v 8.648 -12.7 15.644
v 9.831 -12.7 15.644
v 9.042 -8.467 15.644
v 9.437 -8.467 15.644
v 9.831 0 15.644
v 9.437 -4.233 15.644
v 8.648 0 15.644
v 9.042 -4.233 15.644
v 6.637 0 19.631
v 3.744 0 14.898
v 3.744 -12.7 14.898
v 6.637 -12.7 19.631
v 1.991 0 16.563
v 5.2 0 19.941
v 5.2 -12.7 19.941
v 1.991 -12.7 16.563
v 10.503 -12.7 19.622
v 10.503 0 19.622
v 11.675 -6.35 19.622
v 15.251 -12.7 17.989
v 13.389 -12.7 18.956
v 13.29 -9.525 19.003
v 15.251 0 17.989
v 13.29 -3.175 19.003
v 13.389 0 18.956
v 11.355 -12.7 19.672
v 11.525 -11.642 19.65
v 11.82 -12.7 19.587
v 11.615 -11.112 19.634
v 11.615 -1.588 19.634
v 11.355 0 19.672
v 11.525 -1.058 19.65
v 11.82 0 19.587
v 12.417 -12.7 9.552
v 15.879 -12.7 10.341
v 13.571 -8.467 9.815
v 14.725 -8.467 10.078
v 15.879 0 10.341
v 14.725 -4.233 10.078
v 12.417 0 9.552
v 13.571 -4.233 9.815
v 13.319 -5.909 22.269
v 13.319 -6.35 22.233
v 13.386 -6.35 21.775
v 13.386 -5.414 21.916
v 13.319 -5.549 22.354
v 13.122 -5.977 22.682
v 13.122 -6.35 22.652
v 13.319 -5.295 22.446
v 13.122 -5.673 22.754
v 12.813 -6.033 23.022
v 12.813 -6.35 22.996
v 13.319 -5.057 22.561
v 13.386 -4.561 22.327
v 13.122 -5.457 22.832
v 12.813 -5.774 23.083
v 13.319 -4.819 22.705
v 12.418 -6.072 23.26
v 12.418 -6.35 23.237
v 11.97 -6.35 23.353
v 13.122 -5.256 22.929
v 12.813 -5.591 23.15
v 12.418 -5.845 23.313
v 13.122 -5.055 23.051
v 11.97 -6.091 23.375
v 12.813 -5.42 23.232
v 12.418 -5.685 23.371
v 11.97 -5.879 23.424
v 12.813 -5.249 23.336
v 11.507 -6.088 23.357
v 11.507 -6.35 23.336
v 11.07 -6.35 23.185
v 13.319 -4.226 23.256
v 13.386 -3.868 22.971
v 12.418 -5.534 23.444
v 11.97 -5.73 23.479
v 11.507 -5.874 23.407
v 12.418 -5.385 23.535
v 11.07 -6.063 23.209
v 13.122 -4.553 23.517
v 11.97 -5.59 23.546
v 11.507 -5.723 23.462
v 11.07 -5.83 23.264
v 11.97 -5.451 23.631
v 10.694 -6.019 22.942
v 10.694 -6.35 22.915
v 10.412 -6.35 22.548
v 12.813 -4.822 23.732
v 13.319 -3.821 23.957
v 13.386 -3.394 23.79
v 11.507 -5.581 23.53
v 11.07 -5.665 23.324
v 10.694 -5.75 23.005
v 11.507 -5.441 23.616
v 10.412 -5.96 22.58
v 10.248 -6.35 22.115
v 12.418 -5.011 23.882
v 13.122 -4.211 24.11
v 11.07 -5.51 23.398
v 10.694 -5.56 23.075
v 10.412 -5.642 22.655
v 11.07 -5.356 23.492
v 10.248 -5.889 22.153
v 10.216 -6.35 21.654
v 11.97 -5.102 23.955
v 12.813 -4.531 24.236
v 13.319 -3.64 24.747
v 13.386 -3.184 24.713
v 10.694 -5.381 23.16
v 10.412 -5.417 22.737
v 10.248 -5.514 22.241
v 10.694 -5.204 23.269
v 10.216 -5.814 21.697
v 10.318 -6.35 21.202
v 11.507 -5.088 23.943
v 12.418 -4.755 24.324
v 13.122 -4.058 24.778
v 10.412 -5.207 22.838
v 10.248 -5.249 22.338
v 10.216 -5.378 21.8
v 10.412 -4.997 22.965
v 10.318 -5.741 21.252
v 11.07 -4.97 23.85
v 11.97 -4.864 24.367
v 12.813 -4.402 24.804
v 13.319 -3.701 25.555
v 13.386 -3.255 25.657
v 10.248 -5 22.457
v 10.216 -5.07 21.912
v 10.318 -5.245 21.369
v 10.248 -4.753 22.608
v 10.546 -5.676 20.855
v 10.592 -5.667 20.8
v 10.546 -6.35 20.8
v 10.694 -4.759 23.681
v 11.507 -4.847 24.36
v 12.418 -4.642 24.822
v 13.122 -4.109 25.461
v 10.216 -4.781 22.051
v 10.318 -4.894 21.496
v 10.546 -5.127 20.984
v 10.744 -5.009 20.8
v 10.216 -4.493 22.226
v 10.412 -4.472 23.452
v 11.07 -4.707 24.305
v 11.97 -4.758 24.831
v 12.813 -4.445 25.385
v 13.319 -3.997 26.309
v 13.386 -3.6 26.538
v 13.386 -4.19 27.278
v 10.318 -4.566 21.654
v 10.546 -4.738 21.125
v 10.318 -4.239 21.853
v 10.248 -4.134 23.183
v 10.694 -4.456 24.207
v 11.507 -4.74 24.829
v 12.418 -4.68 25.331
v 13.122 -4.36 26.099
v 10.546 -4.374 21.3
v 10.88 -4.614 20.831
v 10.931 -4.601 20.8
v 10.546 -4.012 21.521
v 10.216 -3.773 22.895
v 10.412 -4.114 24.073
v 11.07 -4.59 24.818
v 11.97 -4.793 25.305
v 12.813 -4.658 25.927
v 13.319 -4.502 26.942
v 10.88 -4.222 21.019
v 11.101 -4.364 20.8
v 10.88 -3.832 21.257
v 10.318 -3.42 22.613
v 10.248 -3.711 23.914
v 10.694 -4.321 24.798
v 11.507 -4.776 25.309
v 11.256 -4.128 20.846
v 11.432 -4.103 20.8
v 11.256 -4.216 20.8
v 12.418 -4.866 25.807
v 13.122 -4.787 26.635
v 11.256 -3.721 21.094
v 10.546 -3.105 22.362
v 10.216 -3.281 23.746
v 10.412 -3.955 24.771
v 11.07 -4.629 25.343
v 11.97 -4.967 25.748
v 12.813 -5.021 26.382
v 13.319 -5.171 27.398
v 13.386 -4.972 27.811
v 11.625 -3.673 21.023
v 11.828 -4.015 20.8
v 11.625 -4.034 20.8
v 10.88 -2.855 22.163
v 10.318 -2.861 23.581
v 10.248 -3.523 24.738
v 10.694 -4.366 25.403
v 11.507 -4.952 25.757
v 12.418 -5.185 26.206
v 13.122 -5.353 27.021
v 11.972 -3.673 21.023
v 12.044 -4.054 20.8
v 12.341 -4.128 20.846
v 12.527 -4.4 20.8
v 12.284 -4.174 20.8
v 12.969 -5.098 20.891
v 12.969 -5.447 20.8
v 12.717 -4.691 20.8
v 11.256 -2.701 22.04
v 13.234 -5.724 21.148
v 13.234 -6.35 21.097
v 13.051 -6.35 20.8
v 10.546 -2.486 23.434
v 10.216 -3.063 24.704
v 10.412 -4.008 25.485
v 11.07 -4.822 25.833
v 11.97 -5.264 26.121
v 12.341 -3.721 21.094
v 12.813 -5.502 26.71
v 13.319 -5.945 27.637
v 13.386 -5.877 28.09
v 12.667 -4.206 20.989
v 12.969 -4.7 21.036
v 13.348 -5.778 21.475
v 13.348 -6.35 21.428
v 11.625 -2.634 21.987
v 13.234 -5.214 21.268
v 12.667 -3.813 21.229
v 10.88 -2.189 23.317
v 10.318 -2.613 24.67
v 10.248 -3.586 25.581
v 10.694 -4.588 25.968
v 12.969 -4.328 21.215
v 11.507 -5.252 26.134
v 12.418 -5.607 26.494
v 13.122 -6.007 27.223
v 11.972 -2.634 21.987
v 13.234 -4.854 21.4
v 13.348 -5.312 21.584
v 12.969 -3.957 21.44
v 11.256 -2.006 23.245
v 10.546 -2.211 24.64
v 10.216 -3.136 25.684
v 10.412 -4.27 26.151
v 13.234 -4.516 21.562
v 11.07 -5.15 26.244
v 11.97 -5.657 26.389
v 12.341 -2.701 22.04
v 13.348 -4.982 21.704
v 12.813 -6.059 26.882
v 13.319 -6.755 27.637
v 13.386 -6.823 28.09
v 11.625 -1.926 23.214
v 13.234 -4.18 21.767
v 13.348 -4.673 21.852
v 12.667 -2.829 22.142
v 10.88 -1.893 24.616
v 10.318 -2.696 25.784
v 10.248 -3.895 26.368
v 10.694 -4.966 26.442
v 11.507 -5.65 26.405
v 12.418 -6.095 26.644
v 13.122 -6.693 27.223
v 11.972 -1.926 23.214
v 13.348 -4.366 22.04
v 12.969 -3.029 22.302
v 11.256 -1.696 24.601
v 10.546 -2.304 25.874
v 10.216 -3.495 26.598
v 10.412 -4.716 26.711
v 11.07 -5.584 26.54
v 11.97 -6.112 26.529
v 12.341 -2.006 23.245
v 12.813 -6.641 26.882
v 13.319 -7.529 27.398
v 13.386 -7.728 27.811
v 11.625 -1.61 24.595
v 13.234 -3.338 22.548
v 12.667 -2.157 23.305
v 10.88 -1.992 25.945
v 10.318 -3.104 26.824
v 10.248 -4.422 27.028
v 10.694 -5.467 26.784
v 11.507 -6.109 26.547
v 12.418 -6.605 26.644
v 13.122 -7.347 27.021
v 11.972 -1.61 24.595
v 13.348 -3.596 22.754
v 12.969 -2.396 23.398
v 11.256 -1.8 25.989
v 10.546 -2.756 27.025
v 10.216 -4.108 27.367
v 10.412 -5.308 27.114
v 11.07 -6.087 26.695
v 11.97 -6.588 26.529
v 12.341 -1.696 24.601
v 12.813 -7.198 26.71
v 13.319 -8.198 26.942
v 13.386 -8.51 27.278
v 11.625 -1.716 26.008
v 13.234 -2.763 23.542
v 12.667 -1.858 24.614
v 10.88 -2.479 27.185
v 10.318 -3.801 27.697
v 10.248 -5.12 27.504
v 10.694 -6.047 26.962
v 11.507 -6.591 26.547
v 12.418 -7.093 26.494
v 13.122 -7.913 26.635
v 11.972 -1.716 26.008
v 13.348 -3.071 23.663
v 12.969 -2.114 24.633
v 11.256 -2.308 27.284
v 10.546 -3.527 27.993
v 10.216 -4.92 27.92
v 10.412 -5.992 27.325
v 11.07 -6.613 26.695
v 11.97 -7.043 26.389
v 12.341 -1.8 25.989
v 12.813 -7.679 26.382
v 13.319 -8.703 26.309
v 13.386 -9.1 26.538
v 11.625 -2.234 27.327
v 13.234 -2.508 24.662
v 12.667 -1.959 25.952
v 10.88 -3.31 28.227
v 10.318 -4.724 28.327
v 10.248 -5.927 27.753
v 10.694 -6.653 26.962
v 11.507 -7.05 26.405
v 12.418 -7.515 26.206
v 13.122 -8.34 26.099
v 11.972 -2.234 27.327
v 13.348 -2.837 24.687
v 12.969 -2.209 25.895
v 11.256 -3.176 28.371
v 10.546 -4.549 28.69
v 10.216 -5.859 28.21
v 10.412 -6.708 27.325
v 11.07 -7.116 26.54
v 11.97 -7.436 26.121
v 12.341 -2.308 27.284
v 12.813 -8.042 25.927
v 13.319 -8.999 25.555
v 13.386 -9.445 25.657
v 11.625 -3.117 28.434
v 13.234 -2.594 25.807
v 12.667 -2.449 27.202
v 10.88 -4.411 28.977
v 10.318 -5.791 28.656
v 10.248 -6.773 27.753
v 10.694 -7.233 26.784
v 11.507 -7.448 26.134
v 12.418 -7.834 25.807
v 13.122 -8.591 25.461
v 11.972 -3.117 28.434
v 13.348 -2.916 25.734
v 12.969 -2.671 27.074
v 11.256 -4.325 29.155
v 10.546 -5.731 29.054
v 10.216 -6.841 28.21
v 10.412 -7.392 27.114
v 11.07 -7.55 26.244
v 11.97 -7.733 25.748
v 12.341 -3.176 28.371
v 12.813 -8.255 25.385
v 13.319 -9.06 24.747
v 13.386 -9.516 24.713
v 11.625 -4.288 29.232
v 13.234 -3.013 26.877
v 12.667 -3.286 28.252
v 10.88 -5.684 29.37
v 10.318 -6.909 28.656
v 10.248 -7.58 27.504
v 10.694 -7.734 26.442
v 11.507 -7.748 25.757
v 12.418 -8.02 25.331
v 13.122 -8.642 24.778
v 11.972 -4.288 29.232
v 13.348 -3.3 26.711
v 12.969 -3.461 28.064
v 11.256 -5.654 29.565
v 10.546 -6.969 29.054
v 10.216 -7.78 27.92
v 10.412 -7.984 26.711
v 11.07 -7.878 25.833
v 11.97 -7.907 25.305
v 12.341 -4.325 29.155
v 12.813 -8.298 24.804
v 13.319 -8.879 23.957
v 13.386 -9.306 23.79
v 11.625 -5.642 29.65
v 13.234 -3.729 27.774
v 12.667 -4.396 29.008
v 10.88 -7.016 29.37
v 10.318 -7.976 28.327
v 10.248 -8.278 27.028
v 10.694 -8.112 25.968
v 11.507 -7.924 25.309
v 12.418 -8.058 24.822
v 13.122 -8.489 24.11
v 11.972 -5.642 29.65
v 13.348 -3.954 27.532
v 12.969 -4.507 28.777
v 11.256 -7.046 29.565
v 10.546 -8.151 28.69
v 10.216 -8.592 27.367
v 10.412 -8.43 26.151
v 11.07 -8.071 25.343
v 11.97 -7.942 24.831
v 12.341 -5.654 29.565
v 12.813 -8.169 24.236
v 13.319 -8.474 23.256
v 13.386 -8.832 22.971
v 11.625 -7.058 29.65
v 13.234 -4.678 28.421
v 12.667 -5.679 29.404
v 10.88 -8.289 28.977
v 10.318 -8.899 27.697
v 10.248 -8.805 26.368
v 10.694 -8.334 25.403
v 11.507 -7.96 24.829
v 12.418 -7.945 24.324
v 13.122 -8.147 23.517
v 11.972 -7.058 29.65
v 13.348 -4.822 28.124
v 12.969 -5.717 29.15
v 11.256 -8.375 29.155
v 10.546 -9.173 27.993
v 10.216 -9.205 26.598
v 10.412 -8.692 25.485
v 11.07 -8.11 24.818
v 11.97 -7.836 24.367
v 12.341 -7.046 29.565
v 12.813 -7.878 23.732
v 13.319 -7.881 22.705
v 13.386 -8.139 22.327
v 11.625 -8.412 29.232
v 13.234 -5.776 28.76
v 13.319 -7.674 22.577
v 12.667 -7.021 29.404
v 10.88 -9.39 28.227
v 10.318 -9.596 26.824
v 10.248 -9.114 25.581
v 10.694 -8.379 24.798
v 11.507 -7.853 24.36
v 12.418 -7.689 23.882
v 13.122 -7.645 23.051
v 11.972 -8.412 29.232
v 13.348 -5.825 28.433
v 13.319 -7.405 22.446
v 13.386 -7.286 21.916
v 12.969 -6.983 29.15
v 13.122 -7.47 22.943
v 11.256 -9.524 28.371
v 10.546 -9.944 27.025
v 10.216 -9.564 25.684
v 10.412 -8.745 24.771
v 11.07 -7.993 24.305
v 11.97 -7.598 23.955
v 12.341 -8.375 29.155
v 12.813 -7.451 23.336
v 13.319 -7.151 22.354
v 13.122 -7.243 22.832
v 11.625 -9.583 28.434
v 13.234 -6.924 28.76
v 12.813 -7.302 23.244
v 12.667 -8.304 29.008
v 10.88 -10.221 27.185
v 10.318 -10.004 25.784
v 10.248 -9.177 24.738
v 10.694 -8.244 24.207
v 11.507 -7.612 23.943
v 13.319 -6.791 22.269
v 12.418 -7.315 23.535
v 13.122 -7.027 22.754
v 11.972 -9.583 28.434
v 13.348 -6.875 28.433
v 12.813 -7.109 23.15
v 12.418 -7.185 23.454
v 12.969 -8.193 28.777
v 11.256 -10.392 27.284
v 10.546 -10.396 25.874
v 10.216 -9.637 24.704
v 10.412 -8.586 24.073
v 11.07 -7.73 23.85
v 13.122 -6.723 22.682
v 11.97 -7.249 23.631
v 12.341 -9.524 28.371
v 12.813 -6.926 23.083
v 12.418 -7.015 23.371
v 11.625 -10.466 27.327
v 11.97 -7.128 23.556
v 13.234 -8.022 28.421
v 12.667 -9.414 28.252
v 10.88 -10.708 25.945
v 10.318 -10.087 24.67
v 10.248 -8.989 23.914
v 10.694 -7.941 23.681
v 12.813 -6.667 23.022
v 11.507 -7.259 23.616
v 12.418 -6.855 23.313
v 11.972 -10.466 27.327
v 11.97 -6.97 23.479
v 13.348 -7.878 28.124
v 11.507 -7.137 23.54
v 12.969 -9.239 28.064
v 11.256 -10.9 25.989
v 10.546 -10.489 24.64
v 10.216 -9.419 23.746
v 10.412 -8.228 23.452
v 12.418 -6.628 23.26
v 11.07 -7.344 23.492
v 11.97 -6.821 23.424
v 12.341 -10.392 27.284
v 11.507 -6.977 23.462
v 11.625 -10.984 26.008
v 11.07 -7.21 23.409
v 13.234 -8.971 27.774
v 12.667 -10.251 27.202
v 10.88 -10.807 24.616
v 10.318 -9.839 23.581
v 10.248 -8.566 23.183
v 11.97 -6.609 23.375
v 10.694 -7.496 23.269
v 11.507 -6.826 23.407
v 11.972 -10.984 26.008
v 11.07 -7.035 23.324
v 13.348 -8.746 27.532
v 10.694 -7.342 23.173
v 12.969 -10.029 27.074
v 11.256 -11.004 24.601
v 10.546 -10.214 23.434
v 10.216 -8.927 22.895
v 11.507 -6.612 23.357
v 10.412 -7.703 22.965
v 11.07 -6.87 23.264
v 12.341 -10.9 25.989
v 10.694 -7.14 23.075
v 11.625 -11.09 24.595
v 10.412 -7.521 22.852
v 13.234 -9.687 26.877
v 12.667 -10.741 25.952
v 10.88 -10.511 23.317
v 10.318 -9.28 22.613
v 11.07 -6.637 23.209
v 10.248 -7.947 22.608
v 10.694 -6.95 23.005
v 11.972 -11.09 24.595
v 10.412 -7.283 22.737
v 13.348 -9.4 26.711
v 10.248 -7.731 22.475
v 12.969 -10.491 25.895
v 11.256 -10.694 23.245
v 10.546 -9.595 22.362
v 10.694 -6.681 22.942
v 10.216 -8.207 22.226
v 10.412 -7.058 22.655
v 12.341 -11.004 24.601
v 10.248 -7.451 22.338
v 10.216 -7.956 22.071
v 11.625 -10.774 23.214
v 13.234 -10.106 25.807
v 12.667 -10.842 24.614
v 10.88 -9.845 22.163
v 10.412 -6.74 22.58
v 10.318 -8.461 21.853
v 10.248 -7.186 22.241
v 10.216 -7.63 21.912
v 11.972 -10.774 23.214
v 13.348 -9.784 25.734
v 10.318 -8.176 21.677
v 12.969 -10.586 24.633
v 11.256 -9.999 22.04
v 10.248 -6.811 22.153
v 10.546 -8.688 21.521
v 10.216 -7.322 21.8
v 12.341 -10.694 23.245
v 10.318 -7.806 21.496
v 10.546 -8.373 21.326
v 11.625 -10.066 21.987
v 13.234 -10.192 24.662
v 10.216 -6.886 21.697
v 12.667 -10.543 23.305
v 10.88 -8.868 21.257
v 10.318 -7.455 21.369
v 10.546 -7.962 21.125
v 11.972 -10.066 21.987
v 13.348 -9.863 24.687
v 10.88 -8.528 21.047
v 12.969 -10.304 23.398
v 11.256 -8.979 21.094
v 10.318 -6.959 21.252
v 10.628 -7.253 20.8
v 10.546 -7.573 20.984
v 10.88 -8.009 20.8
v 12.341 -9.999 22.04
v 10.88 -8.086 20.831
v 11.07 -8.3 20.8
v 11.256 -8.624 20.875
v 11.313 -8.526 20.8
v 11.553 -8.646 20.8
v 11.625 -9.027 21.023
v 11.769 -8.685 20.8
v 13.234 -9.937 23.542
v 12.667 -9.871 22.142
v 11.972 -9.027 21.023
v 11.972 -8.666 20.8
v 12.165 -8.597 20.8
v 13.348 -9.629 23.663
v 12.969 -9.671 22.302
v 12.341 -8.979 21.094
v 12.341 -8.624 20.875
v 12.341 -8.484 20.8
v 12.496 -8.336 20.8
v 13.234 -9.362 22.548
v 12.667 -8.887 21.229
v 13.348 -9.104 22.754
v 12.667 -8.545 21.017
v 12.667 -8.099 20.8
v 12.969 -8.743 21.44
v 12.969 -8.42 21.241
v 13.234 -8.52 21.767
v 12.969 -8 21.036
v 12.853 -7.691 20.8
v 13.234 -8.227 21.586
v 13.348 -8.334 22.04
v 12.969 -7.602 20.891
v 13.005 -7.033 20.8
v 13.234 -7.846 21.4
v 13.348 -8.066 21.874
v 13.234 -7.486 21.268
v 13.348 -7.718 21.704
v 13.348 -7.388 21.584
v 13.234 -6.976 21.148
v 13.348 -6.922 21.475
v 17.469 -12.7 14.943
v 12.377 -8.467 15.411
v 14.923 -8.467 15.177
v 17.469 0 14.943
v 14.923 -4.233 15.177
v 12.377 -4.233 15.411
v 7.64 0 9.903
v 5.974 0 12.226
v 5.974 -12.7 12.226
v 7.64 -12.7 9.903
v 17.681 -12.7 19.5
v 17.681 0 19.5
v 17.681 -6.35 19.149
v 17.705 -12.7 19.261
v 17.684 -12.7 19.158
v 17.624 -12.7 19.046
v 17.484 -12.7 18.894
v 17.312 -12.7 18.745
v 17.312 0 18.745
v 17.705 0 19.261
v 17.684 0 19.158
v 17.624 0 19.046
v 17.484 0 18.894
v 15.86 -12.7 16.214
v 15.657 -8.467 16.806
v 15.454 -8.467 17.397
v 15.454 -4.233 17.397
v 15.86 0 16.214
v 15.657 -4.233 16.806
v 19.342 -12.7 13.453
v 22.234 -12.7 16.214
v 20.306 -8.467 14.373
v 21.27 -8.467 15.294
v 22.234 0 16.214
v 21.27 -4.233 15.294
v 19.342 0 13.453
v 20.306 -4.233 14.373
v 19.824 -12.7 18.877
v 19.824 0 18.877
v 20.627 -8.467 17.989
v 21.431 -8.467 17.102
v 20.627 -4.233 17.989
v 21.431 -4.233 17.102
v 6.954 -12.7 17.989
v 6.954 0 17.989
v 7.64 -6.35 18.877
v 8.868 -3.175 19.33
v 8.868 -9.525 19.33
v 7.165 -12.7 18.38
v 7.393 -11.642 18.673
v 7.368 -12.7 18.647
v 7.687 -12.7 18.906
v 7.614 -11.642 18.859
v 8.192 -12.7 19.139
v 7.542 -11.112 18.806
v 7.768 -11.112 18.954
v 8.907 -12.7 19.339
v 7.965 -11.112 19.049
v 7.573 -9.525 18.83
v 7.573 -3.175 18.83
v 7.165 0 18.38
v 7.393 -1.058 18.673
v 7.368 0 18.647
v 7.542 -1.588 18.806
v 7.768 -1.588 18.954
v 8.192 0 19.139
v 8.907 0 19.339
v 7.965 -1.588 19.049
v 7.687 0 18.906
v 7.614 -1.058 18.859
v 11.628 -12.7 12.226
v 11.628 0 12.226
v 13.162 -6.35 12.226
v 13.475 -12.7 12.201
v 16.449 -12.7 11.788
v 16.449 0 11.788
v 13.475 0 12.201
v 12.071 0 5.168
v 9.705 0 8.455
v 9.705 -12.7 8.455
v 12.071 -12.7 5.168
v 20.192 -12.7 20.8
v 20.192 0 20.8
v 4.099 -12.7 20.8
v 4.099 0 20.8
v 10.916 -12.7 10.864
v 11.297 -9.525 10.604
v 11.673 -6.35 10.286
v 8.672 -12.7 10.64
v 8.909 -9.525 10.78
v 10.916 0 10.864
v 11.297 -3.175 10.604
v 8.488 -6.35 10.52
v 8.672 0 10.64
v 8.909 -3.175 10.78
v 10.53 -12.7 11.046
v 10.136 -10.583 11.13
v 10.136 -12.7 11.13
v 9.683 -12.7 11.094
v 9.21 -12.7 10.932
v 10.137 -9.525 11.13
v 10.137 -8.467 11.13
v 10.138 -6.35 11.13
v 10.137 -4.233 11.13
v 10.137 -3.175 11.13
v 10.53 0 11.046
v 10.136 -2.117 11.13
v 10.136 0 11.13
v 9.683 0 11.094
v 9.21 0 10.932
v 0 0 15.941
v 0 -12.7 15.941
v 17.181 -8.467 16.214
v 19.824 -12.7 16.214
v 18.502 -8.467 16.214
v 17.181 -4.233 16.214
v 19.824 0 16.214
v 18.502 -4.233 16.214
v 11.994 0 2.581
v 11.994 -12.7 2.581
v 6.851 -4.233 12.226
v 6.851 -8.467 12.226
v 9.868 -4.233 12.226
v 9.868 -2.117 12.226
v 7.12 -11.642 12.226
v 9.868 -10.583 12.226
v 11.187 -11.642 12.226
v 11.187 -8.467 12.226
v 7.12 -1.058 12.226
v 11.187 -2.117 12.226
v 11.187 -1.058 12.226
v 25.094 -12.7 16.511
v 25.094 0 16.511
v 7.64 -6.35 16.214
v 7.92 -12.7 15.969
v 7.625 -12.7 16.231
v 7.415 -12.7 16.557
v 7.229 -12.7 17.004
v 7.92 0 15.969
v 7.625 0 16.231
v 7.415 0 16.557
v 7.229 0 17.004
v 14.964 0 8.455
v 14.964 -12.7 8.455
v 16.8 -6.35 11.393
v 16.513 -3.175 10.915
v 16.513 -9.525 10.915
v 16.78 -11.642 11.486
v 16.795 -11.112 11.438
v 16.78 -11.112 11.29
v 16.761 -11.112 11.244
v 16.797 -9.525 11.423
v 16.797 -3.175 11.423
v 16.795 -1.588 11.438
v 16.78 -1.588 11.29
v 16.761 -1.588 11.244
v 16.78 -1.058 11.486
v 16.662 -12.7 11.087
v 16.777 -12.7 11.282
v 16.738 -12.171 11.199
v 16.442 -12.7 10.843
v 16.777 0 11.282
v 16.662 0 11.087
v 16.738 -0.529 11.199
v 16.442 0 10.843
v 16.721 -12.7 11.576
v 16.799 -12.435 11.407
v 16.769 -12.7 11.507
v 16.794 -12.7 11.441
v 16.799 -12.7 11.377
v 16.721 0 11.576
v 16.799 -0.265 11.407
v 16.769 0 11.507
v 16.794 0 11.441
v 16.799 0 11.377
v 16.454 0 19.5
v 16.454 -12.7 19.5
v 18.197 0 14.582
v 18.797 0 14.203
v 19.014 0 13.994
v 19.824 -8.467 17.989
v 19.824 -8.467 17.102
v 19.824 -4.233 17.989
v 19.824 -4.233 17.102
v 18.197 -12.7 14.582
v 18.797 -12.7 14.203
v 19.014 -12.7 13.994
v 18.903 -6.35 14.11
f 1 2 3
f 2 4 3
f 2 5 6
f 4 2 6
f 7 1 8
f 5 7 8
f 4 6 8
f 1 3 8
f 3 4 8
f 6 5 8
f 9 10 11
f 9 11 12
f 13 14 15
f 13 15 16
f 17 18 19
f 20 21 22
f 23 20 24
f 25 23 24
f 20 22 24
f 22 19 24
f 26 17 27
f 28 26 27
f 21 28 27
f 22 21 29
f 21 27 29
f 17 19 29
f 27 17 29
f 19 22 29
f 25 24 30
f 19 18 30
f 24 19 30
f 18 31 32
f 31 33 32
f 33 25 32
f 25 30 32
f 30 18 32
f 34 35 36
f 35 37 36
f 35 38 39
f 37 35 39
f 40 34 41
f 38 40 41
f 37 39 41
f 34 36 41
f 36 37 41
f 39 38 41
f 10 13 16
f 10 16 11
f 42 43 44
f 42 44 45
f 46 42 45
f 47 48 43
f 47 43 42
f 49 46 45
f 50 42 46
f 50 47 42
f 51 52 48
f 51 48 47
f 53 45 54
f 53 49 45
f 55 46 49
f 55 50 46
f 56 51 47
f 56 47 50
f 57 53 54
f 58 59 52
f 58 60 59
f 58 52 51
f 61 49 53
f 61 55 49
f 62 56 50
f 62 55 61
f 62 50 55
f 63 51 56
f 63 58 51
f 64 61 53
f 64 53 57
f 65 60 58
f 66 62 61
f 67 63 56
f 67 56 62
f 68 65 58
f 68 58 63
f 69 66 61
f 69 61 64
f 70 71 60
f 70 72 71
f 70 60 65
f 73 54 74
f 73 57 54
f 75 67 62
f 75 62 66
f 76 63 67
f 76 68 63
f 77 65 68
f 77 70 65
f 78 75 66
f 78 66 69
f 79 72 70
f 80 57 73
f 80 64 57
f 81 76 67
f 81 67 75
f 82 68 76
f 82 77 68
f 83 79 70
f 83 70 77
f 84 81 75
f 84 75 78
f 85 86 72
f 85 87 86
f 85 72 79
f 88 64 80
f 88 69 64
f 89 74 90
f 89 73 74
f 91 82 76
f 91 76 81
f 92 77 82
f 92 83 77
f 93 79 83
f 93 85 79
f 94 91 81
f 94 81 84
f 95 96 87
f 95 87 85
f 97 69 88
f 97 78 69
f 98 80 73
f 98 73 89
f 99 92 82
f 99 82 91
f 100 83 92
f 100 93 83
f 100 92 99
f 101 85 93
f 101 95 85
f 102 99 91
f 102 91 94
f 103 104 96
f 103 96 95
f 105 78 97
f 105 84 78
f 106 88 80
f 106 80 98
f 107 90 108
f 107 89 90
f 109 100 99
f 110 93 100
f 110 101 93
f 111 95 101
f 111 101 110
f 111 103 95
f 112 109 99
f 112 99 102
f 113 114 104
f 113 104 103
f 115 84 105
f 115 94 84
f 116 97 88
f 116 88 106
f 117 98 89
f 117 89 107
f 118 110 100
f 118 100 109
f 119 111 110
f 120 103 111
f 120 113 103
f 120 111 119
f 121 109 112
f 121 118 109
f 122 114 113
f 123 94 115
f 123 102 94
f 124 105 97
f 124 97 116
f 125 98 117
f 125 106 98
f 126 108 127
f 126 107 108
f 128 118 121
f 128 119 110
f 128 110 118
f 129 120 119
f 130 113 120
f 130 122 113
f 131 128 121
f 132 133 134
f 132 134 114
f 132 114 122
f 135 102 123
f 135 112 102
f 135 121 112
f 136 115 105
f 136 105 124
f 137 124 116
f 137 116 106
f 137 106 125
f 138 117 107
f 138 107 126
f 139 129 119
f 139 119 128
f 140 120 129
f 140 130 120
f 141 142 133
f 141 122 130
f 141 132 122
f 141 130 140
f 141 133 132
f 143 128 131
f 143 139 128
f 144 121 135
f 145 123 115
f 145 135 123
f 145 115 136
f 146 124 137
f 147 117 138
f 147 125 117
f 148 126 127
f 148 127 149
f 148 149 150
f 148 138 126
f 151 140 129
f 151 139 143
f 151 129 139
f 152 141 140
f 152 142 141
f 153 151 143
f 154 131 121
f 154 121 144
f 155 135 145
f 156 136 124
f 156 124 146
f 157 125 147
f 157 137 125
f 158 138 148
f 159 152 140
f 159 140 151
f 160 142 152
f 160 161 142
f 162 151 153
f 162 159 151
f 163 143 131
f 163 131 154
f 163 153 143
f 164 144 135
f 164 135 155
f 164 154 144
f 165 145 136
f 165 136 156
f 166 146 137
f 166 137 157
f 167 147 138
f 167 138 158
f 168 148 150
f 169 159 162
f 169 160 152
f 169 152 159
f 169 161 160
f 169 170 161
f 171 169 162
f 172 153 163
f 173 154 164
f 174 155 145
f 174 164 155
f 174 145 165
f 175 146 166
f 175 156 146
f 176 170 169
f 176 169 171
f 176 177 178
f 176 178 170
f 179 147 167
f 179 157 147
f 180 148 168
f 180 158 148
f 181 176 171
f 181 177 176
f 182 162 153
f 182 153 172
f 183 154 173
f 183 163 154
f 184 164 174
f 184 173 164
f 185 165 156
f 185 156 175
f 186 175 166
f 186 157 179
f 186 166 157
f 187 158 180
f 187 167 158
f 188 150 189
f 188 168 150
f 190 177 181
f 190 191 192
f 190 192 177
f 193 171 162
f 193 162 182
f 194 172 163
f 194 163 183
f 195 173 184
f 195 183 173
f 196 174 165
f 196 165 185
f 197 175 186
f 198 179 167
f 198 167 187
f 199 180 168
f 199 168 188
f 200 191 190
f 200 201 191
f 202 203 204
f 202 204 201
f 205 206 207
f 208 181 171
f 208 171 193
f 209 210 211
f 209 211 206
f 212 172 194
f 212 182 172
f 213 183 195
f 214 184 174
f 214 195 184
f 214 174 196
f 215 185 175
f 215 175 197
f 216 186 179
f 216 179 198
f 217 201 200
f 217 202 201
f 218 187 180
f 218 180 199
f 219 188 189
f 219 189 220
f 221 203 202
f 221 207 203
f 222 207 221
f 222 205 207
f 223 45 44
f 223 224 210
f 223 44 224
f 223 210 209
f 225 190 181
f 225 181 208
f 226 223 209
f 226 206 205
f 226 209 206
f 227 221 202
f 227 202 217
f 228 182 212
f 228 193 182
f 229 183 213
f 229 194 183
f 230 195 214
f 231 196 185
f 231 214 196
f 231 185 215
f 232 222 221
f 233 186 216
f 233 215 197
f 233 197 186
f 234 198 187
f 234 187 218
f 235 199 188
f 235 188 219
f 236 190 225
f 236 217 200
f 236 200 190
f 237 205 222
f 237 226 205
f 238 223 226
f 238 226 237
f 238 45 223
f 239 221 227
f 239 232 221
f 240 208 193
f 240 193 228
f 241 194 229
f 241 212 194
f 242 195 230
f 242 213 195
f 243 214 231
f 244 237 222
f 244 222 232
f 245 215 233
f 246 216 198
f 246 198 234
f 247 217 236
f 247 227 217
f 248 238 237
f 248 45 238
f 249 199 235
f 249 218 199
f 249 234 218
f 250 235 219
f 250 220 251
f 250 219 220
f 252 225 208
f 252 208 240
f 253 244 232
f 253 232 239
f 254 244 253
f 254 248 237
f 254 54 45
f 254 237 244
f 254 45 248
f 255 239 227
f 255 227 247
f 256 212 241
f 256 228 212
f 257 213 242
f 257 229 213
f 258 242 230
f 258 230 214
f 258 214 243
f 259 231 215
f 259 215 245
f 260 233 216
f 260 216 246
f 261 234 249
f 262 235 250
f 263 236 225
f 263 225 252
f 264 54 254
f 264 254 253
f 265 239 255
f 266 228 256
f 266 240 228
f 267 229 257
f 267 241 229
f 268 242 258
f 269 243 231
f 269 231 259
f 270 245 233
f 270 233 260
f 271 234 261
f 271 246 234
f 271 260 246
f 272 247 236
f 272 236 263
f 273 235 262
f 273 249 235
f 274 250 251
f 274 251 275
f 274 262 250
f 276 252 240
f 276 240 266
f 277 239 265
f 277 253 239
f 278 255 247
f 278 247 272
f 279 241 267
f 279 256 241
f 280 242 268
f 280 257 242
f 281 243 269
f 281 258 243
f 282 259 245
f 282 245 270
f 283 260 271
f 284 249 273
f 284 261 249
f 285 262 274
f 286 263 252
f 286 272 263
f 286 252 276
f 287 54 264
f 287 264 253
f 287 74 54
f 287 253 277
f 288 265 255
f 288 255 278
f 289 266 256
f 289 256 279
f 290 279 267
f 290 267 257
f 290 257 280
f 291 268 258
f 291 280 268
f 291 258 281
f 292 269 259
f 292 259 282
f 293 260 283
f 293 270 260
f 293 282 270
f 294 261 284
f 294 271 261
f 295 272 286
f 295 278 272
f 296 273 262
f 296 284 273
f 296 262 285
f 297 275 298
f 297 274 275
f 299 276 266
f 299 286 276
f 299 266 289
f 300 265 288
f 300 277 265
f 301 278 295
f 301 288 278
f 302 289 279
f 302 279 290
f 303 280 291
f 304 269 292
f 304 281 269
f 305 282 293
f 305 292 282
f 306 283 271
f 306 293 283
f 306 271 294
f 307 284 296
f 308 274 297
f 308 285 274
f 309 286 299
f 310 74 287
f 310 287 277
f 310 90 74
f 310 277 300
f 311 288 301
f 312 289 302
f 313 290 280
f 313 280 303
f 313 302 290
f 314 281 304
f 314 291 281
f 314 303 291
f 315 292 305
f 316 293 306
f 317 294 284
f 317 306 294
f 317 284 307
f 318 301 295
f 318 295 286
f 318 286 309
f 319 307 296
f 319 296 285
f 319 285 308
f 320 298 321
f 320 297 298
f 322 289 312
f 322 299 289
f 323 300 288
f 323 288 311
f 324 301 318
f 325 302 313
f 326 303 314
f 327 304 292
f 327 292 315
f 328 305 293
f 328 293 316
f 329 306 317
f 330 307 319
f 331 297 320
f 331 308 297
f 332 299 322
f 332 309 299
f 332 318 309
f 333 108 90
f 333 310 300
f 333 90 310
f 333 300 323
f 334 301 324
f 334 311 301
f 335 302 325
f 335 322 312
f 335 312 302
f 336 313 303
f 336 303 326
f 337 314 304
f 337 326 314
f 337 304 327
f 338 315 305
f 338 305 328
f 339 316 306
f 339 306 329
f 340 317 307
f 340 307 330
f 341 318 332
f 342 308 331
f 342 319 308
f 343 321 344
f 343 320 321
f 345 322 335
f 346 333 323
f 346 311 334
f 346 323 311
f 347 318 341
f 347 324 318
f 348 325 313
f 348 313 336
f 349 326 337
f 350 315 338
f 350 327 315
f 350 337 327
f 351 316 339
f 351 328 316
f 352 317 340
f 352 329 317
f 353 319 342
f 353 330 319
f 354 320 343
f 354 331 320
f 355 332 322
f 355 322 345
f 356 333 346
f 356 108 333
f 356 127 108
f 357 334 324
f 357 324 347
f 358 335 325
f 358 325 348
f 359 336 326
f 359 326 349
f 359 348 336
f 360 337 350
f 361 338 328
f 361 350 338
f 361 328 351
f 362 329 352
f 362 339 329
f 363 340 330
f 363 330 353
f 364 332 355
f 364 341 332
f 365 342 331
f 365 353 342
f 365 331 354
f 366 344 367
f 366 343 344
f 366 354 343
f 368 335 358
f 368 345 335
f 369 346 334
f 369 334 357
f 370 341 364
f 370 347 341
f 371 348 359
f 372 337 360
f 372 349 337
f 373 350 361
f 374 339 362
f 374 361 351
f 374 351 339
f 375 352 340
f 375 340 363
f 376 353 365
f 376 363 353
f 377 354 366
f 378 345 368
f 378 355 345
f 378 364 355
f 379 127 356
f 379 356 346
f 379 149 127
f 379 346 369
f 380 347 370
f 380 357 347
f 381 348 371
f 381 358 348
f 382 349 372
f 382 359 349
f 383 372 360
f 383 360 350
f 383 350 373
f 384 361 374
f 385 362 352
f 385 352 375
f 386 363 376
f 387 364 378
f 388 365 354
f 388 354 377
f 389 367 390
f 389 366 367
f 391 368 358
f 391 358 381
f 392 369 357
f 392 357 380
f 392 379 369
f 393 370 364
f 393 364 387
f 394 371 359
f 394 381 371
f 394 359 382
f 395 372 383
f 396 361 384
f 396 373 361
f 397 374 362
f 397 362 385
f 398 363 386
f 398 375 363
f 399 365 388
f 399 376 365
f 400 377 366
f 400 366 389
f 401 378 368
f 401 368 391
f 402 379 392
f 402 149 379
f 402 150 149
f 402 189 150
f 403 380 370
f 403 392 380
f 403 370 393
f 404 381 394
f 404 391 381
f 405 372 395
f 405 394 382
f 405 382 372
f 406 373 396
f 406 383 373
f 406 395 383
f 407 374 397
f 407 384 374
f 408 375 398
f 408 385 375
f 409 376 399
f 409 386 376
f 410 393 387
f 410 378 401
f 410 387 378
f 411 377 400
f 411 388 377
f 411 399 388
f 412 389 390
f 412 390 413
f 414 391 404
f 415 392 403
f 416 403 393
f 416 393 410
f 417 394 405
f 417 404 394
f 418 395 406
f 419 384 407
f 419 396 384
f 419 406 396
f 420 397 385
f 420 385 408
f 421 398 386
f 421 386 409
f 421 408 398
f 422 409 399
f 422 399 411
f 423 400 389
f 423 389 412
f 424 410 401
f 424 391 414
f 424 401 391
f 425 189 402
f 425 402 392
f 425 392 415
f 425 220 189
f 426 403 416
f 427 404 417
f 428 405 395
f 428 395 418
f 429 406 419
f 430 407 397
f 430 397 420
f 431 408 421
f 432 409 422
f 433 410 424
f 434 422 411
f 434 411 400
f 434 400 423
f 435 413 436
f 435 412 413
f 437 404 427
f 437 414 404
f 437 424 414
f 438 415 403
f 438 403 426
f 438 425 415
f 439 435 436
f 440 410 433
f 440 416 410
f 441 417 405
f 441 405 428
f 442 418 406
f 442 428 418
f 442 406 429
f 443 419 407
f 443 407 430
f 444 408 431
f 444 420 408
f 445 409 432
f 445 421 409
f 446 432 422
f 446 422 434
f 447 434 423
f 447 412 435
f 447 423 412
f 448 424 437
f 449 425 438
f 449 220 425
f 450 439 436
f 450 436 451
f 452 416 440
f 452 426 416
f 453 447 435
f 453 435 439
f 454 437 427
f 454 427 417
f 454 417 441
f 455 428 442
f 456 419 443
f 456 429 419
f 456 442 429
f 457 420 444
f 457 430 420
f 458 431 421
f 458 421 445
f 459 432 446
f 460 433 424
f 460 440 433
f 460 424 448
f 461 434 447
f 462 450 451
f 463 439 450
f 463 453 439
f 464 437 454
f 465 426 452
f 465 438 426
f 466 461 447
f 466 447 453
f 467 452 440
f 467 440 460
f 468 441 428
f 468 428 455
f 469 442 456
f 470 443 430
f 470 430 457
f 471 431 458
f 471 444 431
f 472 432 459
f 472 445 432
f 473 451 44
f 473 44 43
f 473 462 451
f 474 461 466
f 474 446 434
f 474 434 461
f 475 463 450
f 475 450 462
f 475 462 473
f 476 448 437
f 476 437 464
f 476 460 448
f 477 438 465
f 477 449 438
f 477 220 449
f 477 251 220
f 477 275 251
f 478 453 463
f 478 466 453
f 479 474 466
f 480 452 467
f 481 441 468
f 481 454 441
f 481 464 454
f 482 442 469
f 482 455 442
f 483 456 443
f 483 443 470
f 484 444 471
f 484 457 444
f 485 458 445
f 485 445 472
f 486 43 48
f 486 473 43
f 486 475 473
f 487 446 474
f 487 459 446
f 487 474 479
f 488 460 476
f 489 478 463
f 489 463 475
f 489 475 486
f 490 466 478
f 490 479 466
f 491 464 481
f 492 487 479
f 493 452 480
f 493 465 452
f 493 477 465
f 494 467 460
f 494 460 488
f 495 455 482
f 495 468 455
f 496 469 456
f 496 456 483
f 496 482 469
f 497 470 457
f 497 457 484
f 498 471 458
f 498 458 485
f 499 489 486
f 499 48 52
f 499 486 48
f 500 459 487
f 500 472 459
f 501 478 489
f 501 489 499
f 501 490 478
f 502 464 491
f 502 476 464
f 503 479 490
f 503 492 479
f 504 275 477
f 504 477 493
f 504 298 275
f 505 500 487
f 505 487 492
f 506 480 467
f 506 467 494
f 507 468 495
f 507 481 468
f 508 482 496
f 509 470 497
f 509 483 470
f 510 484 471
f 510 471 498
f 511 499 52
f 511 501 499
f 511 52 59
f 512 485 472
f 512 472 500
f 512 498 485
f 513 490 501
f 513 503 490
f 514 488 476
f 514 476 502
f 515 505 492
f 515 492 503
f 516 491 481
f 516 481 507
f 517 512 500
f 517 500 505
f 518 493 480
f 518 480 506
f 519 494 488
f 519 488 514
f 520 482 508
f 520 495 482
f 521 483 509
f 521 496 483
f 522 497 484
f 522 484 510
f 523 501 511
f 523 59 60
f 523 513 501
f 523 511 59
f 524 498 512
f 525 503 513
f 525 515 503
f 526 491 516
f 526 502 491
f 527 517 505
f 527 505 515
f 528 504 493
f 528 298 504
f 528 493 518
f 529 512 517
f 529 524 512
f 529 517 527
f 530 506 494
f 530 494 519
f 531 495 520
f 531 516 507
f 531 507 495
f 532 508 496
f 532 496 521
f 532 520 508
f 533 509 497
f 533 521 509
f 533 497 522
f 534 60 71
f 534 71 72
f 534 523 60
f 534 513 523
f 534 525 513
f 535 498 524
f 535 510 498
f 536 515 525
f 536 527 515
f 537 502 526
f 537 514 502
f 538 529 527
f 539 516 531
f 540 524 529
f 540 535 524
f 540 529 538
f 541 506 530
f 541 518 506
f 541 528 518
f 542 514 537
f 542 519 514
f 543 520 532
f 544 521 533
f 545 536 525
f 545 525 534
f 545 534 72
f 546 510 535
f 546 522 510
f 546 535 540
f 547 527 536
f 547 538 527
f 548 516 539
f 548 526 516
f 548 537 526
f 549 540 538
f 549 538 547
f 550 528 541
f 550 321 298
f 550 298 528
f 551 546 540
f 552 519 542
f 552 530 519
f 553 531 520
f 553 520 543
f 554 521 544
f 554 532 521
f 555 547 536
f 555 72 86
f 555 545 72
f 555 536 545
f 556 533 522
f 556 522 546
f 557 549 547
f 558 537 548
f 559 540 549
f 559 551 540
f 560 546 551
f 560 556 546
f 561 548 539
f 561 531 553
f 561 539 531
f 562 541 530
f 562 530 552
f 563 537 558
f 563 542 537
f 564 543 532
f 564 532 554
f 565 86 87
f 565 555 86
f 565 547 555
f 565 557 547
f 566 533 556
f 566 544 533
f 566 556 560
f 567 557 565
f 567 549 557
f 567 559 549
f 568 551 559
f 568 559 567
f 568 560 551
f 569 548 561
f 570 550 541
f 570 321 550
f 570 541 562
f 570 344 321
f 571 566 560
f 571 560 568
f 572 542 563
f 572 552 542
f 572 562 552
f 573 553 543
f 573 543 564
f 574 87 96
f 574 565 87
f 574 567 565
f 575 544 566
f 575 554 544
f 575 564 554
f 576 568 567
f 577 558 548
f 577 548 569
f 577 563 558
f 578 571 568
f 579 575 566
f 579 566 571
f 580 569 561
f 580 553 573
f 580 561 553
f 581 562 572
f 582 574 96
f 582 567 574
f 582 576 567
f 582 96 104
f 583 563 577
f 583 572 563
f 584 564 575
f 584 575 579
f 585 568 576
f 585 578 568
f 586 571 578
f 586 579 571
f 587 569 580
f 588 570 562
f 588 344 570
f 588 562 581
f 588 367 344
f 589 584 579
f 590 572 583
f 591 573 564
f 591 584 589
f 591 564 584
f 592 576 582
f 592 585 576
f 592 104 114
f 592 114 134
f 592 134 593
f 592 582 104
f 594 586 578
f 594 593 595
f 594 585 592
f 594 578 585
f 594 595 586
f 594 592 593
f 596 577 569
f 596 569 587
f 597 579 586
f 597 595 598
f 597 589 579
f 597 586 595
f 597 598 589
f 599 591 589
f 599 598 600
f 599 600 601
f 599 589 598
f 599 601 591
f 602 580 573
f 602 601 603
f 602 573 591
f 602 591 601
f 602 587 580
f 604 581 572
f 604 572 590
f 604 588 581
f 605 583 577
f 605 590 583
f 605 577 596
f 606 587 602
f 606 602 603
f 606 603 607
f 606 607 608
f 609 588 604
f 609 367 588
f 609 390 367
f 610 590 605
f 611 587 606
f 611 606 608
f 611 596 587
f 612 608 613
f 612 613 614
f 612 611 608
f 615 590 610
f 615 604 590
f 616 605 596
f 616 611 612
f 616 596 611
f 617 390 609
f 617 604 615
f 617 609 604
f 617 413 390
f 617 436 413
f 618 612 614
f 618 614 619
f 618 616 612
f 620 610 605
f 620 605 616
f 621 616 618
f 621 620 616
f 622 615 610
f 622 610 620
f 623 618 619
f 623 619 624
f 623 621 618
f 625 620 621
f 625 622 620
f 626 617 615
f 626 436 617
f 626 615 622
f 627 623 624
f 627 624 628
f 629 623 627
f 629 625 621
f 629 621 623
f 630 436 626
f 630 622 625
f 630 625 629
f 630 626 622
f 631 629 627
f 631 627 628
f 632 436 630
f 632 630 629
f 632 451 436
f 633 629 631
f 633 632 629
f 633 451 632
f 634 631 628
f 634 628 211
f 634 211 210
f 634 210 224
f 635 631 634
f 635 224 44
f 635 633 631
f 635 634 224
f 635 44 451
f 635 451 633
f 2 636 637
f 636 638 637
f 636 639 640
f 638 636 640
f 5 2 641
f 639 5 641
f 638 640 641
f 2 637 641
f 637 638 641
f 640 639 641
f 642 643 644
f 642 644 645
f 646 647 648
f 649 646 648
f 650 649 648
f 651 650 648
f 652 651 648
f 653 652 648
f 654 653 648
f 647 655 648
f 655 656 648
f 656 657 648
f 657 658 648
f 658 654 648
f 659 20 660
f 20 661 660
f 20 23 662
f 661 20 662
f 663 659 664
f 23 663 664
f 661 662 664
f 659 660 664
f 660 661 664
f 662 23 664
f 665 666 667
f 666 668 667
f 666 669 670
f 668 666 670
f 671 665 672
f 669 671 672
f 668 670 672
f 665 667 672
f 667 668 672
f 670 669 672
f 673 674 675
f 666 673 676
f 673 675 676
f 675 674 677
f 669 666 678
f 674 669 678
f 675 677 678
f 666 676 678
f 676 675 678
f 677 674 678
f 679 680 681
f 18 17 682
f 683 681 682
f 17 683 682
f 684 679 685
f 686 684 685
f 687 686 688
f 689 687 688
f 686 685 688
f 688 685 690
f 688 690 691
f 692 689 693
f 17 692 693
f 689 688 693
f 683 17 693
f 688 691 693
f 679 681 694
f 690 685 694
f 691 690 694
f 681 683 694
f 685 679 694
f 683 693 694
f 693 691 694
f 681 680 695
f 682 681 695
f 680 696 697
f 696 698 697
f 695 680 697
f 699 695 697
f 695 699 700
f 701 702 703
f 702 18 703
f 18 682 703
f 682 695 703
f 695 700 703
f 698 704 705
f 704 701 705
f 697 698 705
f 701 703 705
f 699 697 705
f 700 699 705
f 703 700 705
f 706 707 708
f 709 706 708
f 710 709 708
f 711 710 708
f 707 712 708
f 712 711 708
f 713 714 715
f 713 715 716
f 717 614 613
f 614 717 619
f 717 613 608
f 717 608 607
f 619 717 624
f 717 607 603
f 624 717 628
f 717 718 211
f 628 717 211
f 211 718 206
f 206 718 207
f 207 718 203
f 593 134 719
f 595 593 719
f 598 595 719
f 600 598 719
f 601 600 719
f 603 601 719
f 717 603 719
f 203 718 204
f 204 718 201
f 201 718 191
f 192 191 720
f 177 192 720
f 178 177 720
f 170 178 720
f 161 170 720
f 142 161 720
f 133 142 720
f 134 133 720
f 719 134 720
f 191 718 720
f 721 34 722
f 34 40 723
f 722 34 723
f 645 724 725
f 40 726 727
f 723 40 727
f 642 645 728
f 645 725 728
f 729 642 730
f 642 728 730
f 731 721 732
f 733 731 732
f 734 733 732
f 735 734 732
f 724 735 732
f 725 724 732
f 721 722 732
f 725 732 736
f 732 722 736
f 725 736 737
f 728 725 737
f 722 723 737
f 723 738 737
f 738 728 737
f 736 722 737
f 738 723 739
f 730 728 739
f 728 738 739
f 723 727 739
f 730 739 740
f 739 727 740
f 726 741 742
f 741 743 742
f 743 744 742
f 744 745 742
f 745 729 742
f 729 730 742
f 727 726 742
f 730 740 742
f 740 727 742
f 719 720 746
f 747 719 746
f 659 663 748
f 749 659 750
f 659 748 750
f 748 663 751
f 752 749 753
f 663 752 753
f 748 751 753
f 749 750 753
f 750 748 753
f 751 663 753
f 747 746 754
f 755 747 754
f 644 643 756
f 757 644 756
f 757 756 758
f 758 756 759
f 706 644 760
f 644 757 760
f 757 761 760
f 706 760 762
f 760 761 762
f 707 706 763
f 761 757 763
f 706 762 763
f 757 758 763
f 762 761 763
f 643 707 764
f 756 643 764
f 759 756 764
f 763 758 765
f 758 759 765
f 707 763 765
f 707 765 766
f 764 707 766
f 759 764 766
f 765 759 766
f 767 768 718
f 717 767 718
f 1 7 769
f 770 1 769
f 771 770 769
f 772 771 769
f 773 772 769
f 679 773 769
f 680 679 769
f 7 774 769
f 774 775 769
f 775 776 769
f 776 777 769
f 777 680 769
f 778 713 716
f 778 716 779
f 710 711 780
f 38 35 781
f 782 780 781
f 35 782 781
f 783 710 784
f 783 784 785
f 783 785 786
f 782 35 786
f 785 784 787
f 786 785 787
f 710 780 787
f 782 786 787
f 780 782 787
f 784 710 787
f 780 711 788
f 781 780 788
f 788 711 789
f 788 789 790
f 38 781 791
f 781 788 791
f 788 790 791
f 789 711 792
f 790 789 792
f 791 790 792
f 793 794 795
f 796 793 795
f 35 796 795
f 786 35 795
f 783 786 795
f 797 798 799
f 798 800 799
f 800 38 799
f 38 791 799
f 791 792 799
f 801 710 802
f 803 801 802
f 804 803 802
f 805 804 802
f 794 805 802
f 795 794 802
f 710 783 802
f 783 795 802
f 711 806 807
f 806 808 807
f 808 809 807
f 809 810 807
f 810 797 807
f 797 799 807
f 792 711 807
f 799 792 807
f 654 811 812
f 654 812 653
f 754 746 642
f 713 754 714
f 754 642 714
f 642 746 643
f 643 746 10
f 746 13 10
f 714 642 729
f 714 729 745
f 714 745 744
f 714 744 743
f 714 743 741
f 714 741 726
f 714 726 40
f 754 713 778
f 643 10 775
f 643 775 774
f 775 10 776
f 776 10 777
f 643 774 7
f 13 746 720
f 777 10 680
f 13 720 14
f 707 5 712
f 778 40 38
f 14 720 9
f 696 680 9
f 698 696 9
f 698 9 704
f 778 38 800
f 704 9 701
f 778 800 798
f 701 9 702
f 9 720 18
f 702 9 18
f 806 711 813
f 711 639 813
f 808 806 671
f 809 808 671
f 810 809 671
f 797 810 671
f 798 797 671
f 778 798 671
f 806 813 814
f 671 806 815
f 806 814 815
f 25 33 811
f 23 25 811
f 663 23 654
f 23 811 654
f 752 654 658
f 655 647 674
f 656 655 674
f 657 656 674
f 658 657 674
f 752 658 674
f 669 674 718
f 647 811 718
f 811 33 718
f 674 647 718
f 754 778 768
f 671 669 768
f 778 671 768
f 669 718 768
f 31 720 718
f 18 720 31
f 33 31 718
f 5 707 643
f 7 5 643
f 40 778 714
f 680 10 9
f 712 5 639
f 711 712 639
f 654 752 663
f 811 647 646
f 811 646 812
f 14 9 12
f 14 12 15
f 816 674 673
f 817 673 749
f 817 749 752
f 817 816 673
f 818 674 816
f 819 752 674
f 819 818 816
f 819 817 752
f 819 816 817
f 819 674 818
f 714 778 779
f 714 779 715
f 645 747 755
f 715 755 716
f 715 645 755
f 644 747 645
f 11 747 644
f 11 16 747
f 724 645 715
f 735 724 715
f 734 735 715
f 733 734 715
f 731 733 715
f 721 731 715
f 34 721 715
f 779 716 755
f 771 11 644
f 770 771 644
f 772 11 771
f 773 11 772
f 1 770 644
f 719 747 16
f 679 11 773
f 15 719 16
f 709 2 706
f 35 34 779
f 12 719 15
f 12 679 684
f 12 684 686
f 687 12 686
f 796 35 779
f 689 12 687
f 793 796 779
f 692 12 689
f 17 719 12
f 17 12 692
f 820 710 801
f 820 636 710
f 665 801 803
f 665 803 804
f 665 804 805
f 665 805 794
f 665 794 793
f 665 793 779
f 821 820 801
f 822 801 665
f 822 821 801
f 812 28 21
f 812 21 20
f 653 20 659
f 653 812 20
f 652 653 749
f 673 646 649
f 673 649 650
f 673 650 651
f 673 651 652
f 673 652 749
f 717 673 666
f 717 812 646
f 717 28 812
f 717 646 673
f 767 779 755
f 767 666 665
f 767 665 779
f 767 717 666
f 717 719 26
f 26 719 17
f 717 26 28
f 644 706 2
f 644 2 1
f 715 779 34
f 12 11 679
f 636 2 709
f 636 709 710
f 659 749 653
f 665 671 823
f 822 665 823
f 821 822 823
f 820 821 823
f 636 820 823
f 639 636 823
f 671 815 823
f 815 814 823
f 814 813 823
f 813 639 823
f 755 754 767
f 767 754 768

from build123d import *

# Parameters (mm, degrees)
F1_DEPTH = 12.7
F3_DEPTH = 12.7
F5_R     = 1.5875


with BuildPart() as f1:
    # F0 (on Front) → F1 (new body)
    with BuildSketch(Plane.XZ):
        Polygon((20.1922785491, 20.7995641977), (4.0991832502, 20.7995641977), (0, 15.9412715584), (11.9939092547, 2.5809677318), (25.0935649863, 16.5109376256), align=None)
    extrude(amount=F1_DEPTH)

    # F2 (on Front) → F3 (cut)
    with BuildSketch(Plane.XZ):
        with BuildLine():
            Line((17.6813211292, 19.4996427745), (16.4541602135, 19.4996427745))
            Line((16.4541602135, 19.4996427745), (17.3117336033, 18.7449781331))
            add(Edge.make_bspline(
                [(17.6813211292, 19.4996427745), (17.7032305031, 19.3807477202), (17.7525202529, 19.1132682608), (17.4691469903, 18.8765016183), (17.3117336033, 18.7449781331)],
                knots=[0, 0, 0, 0, 0.4445016245, 1, 1, 1, 1], degree=3))
        make_face()
        Polygon((5.2000629936, 19.9409676004), (1.9912079442, 16.5632255375), (3.7442932371, 14.8977944627), (6.6368840635, 19.6311250329), align=None)
        with BuildLine():
            add(Edge.make_bspline(
                [(5.9742834419, 12.2258234769), (6.1523076349, 12.2258234769), (6.7421028422, 12.2258234769), (11.5059476456, 12.2258234769), (11.614881434, 12.2258234769), (11.6279833019, 12.2258234769)],
                knots=[0, 0, 0, 0, 0.2755402737, 0.9128665611, 1, 1, 1, 1], degree=3))
            Line((5.9742834419, 12.2258234769), (7.6397149824, 9.9029857665))
            add(Edge.make_bspline(
                [(12.4168721959, 9.5523688942), (11.6750178309, 10.3115895536), (10.1897836888, 11.8315919933), (8.4903196969, 10.5462945311), (7.6397149824, 9.9029857665)],
                knots=[0, 0, 0, 0, 0.4994864742, 1, 1, 1, 1], degree=3))
            add(Edge.make_bspline(
                [(15.8792156726, 10.3412568569), (14.7251011804, 10.0782942027), (13.5709866881, 9.8153315485), (12.4168721959, 9.5523688942)],
                knots=[0, 0, 0, 0, 3.5510796342, 3.5510796342, 3.5510796342, 3.5510796342], degree=3))
            add(Edge.make_bspline(
                [(16.4489671588, 11.7875523865), (16.6239572067, 11.6720505113), (17.0837218758, 11.3685836453), (16.3399204362, 10.7341932685), (15.8792156726, 10.3412568569)],
                knots=[0, 0, 0, 0, 0.3806078624, 1, 1, 1, 1], degree=3))
            add(Edge.make_bspline(
                [(11.6279833019, 12.2258234769), (12.0919609459, 12.2459342989), (13.2381309235, 12.2956143226), (15.2509508517, 11.9771187299), (16.4489671588, 11.7875523865)],
                knots=[0, 0, 0, 0, 0.4048070121, 1, 1, 1, 1], degree=3))
        make_face()
        Polygon((14.9640385062, 8.4552066401), (9.7047826275, 8.4552066401), (12.0714474469, 5.1681715995), align=None)
        with BuildLine():
            add(Edge.make_bspline(
                [(19.8236573488, 18.8765016183), (20.6271546582, 17.9890321434), (21.4306519677, 17.1015626684), (22.2341492772, 16.2140931934)],
                knots=[0, 0, 0, 0, 3.5915024653, 3.5915024653, 3.5915024653, 3.5915024653], degree=3))
            add(Edge.make_bspline(
                [(19.8236573488, 18.8765016183), (19.8236573488, 17.9890321434), (19.8236573488, 17.1015626684), (19.8236573488, 16.2140931934)],
                knots=[0, 0, 0, 0, 2.6624084249, 2.6624084249, 2.6624084249, 2.6624084249], degree=3))
            add(Edge.make_bspline(
                [(15.8595424145, 16.2140931934), (17.1809140593, 16.2140931934), (18.502285704, 16.2140931934), (19.8236573488, 16.2140931934)],
                knots=[0, 0, 0, 0, 3.9641149342, 3.9641149342, 3.9641149342, 3.9641149342], degree=3))
            add(Edge.make_bspline(
                [(15.2509508517, 17.9890321434), (15.453814706, 17.3973858267), (15.6566785603, 16.8057395101), (15.8595424145, 16.2140931934)],
                knots=[0, 0, 0, 0, 1.8763773518, 1.8763773518, 1.8763773518, 1.8763773518], degree=3))
            add(Edge.make_bspline(
                [(10.5025572702, 19.6218397468), (10.8474319302, 19.6743356606), (11.8237986261, 19.8229556312), (13.9049250513, 18.7093118882), (15.2509508517, 17.9890321434)],
                knots=[0, 0, 0, 0, 0.3532224741, 1, 1, 1, 1], degree=3))
            add(Edge.make_bspline(
                [(6.9544250146, 17.9890321434), (7.114441899, 18.3120753944), (7.5343741338, 19.1598376469), (9.3677788629, 19.4452098076), (10.5025572702, 19.6218397468)],
                knots=[0, 0, 0, 0, 0.3810540633, 1, 1, 1, 1], degree=3))
            add(Edge.make_bspline(
                [(8.6477389559, 15.6443398446), (8.2771524999, 15.77473769), (7.431523863, 16.0722881008), (7.126036346, 17.2995838282), (6.9544250146, 17.9890321434)],
                knots=[0, 0, 0, 0, 0.4382378267, 1, 1, 1, 1], degree=3))
            add(Edge.make_bspline(
                [(9.8310709, 15.6443398446), (9.4366269186, 15.6443398446), (9.0421829373, 15.6443398446), (8.6477389559, 15.6443398446)],
                knots=[0, 0, 0, 0, 1.183331944, 1.183331944, 1.183331944, 1.183331944], degree=3))
            add(Edge.make_bspline(
                [(17.4691469903, 14.9431061), (14.9231216269, 15.1768506815), (12.3770962634, 15.410595263), (9.8310709, 15.6443398446)],
                knots=[0, 0, 0, 0, 7.6701978545, 7.6701978545, 7.6701978545, 7.6701978545], degree=3))
            add(Edge.make_bspline(
                [(19.341558218, 13.4529834613), (19.2330129493, 13.6777429293), (18.9672111523, 14.2281259282), (18.025997796, 14.6773382545), (17.4691469903, 14.9431061)],
                knots=[0, 0, 0, 0, 0.4083692056, 1, 1, 1, 1], degree=3))
            add(Edge.make_bspline(
                [(22.2341492772, 16.2140931934), (21.2699522575, 15.2937232827), (20.3057552377, 14.373353372), (19.341558218, 13.4529834613)],
                knots=[0, 0, 0, 0, 3.9988510836, 3.9988510836, 3.9988510836, 3.9988510836], degree=3))
        make_face()
    extrude(amount=F3_DEPTH, mode=Mode.SUBTRACT)

    # F5 (on offset) → F6 (revolve)
    with BuildSketch(Plane.XZ.offset(6.35)):
        with Locations((11.7986029778, 21.7750984586)):
            Circle(F5_R)
    revolve(axis=Axis((13.9984451234, -6.35, 24.9500984586), (1, 0, 0)))


solid = f1.part
